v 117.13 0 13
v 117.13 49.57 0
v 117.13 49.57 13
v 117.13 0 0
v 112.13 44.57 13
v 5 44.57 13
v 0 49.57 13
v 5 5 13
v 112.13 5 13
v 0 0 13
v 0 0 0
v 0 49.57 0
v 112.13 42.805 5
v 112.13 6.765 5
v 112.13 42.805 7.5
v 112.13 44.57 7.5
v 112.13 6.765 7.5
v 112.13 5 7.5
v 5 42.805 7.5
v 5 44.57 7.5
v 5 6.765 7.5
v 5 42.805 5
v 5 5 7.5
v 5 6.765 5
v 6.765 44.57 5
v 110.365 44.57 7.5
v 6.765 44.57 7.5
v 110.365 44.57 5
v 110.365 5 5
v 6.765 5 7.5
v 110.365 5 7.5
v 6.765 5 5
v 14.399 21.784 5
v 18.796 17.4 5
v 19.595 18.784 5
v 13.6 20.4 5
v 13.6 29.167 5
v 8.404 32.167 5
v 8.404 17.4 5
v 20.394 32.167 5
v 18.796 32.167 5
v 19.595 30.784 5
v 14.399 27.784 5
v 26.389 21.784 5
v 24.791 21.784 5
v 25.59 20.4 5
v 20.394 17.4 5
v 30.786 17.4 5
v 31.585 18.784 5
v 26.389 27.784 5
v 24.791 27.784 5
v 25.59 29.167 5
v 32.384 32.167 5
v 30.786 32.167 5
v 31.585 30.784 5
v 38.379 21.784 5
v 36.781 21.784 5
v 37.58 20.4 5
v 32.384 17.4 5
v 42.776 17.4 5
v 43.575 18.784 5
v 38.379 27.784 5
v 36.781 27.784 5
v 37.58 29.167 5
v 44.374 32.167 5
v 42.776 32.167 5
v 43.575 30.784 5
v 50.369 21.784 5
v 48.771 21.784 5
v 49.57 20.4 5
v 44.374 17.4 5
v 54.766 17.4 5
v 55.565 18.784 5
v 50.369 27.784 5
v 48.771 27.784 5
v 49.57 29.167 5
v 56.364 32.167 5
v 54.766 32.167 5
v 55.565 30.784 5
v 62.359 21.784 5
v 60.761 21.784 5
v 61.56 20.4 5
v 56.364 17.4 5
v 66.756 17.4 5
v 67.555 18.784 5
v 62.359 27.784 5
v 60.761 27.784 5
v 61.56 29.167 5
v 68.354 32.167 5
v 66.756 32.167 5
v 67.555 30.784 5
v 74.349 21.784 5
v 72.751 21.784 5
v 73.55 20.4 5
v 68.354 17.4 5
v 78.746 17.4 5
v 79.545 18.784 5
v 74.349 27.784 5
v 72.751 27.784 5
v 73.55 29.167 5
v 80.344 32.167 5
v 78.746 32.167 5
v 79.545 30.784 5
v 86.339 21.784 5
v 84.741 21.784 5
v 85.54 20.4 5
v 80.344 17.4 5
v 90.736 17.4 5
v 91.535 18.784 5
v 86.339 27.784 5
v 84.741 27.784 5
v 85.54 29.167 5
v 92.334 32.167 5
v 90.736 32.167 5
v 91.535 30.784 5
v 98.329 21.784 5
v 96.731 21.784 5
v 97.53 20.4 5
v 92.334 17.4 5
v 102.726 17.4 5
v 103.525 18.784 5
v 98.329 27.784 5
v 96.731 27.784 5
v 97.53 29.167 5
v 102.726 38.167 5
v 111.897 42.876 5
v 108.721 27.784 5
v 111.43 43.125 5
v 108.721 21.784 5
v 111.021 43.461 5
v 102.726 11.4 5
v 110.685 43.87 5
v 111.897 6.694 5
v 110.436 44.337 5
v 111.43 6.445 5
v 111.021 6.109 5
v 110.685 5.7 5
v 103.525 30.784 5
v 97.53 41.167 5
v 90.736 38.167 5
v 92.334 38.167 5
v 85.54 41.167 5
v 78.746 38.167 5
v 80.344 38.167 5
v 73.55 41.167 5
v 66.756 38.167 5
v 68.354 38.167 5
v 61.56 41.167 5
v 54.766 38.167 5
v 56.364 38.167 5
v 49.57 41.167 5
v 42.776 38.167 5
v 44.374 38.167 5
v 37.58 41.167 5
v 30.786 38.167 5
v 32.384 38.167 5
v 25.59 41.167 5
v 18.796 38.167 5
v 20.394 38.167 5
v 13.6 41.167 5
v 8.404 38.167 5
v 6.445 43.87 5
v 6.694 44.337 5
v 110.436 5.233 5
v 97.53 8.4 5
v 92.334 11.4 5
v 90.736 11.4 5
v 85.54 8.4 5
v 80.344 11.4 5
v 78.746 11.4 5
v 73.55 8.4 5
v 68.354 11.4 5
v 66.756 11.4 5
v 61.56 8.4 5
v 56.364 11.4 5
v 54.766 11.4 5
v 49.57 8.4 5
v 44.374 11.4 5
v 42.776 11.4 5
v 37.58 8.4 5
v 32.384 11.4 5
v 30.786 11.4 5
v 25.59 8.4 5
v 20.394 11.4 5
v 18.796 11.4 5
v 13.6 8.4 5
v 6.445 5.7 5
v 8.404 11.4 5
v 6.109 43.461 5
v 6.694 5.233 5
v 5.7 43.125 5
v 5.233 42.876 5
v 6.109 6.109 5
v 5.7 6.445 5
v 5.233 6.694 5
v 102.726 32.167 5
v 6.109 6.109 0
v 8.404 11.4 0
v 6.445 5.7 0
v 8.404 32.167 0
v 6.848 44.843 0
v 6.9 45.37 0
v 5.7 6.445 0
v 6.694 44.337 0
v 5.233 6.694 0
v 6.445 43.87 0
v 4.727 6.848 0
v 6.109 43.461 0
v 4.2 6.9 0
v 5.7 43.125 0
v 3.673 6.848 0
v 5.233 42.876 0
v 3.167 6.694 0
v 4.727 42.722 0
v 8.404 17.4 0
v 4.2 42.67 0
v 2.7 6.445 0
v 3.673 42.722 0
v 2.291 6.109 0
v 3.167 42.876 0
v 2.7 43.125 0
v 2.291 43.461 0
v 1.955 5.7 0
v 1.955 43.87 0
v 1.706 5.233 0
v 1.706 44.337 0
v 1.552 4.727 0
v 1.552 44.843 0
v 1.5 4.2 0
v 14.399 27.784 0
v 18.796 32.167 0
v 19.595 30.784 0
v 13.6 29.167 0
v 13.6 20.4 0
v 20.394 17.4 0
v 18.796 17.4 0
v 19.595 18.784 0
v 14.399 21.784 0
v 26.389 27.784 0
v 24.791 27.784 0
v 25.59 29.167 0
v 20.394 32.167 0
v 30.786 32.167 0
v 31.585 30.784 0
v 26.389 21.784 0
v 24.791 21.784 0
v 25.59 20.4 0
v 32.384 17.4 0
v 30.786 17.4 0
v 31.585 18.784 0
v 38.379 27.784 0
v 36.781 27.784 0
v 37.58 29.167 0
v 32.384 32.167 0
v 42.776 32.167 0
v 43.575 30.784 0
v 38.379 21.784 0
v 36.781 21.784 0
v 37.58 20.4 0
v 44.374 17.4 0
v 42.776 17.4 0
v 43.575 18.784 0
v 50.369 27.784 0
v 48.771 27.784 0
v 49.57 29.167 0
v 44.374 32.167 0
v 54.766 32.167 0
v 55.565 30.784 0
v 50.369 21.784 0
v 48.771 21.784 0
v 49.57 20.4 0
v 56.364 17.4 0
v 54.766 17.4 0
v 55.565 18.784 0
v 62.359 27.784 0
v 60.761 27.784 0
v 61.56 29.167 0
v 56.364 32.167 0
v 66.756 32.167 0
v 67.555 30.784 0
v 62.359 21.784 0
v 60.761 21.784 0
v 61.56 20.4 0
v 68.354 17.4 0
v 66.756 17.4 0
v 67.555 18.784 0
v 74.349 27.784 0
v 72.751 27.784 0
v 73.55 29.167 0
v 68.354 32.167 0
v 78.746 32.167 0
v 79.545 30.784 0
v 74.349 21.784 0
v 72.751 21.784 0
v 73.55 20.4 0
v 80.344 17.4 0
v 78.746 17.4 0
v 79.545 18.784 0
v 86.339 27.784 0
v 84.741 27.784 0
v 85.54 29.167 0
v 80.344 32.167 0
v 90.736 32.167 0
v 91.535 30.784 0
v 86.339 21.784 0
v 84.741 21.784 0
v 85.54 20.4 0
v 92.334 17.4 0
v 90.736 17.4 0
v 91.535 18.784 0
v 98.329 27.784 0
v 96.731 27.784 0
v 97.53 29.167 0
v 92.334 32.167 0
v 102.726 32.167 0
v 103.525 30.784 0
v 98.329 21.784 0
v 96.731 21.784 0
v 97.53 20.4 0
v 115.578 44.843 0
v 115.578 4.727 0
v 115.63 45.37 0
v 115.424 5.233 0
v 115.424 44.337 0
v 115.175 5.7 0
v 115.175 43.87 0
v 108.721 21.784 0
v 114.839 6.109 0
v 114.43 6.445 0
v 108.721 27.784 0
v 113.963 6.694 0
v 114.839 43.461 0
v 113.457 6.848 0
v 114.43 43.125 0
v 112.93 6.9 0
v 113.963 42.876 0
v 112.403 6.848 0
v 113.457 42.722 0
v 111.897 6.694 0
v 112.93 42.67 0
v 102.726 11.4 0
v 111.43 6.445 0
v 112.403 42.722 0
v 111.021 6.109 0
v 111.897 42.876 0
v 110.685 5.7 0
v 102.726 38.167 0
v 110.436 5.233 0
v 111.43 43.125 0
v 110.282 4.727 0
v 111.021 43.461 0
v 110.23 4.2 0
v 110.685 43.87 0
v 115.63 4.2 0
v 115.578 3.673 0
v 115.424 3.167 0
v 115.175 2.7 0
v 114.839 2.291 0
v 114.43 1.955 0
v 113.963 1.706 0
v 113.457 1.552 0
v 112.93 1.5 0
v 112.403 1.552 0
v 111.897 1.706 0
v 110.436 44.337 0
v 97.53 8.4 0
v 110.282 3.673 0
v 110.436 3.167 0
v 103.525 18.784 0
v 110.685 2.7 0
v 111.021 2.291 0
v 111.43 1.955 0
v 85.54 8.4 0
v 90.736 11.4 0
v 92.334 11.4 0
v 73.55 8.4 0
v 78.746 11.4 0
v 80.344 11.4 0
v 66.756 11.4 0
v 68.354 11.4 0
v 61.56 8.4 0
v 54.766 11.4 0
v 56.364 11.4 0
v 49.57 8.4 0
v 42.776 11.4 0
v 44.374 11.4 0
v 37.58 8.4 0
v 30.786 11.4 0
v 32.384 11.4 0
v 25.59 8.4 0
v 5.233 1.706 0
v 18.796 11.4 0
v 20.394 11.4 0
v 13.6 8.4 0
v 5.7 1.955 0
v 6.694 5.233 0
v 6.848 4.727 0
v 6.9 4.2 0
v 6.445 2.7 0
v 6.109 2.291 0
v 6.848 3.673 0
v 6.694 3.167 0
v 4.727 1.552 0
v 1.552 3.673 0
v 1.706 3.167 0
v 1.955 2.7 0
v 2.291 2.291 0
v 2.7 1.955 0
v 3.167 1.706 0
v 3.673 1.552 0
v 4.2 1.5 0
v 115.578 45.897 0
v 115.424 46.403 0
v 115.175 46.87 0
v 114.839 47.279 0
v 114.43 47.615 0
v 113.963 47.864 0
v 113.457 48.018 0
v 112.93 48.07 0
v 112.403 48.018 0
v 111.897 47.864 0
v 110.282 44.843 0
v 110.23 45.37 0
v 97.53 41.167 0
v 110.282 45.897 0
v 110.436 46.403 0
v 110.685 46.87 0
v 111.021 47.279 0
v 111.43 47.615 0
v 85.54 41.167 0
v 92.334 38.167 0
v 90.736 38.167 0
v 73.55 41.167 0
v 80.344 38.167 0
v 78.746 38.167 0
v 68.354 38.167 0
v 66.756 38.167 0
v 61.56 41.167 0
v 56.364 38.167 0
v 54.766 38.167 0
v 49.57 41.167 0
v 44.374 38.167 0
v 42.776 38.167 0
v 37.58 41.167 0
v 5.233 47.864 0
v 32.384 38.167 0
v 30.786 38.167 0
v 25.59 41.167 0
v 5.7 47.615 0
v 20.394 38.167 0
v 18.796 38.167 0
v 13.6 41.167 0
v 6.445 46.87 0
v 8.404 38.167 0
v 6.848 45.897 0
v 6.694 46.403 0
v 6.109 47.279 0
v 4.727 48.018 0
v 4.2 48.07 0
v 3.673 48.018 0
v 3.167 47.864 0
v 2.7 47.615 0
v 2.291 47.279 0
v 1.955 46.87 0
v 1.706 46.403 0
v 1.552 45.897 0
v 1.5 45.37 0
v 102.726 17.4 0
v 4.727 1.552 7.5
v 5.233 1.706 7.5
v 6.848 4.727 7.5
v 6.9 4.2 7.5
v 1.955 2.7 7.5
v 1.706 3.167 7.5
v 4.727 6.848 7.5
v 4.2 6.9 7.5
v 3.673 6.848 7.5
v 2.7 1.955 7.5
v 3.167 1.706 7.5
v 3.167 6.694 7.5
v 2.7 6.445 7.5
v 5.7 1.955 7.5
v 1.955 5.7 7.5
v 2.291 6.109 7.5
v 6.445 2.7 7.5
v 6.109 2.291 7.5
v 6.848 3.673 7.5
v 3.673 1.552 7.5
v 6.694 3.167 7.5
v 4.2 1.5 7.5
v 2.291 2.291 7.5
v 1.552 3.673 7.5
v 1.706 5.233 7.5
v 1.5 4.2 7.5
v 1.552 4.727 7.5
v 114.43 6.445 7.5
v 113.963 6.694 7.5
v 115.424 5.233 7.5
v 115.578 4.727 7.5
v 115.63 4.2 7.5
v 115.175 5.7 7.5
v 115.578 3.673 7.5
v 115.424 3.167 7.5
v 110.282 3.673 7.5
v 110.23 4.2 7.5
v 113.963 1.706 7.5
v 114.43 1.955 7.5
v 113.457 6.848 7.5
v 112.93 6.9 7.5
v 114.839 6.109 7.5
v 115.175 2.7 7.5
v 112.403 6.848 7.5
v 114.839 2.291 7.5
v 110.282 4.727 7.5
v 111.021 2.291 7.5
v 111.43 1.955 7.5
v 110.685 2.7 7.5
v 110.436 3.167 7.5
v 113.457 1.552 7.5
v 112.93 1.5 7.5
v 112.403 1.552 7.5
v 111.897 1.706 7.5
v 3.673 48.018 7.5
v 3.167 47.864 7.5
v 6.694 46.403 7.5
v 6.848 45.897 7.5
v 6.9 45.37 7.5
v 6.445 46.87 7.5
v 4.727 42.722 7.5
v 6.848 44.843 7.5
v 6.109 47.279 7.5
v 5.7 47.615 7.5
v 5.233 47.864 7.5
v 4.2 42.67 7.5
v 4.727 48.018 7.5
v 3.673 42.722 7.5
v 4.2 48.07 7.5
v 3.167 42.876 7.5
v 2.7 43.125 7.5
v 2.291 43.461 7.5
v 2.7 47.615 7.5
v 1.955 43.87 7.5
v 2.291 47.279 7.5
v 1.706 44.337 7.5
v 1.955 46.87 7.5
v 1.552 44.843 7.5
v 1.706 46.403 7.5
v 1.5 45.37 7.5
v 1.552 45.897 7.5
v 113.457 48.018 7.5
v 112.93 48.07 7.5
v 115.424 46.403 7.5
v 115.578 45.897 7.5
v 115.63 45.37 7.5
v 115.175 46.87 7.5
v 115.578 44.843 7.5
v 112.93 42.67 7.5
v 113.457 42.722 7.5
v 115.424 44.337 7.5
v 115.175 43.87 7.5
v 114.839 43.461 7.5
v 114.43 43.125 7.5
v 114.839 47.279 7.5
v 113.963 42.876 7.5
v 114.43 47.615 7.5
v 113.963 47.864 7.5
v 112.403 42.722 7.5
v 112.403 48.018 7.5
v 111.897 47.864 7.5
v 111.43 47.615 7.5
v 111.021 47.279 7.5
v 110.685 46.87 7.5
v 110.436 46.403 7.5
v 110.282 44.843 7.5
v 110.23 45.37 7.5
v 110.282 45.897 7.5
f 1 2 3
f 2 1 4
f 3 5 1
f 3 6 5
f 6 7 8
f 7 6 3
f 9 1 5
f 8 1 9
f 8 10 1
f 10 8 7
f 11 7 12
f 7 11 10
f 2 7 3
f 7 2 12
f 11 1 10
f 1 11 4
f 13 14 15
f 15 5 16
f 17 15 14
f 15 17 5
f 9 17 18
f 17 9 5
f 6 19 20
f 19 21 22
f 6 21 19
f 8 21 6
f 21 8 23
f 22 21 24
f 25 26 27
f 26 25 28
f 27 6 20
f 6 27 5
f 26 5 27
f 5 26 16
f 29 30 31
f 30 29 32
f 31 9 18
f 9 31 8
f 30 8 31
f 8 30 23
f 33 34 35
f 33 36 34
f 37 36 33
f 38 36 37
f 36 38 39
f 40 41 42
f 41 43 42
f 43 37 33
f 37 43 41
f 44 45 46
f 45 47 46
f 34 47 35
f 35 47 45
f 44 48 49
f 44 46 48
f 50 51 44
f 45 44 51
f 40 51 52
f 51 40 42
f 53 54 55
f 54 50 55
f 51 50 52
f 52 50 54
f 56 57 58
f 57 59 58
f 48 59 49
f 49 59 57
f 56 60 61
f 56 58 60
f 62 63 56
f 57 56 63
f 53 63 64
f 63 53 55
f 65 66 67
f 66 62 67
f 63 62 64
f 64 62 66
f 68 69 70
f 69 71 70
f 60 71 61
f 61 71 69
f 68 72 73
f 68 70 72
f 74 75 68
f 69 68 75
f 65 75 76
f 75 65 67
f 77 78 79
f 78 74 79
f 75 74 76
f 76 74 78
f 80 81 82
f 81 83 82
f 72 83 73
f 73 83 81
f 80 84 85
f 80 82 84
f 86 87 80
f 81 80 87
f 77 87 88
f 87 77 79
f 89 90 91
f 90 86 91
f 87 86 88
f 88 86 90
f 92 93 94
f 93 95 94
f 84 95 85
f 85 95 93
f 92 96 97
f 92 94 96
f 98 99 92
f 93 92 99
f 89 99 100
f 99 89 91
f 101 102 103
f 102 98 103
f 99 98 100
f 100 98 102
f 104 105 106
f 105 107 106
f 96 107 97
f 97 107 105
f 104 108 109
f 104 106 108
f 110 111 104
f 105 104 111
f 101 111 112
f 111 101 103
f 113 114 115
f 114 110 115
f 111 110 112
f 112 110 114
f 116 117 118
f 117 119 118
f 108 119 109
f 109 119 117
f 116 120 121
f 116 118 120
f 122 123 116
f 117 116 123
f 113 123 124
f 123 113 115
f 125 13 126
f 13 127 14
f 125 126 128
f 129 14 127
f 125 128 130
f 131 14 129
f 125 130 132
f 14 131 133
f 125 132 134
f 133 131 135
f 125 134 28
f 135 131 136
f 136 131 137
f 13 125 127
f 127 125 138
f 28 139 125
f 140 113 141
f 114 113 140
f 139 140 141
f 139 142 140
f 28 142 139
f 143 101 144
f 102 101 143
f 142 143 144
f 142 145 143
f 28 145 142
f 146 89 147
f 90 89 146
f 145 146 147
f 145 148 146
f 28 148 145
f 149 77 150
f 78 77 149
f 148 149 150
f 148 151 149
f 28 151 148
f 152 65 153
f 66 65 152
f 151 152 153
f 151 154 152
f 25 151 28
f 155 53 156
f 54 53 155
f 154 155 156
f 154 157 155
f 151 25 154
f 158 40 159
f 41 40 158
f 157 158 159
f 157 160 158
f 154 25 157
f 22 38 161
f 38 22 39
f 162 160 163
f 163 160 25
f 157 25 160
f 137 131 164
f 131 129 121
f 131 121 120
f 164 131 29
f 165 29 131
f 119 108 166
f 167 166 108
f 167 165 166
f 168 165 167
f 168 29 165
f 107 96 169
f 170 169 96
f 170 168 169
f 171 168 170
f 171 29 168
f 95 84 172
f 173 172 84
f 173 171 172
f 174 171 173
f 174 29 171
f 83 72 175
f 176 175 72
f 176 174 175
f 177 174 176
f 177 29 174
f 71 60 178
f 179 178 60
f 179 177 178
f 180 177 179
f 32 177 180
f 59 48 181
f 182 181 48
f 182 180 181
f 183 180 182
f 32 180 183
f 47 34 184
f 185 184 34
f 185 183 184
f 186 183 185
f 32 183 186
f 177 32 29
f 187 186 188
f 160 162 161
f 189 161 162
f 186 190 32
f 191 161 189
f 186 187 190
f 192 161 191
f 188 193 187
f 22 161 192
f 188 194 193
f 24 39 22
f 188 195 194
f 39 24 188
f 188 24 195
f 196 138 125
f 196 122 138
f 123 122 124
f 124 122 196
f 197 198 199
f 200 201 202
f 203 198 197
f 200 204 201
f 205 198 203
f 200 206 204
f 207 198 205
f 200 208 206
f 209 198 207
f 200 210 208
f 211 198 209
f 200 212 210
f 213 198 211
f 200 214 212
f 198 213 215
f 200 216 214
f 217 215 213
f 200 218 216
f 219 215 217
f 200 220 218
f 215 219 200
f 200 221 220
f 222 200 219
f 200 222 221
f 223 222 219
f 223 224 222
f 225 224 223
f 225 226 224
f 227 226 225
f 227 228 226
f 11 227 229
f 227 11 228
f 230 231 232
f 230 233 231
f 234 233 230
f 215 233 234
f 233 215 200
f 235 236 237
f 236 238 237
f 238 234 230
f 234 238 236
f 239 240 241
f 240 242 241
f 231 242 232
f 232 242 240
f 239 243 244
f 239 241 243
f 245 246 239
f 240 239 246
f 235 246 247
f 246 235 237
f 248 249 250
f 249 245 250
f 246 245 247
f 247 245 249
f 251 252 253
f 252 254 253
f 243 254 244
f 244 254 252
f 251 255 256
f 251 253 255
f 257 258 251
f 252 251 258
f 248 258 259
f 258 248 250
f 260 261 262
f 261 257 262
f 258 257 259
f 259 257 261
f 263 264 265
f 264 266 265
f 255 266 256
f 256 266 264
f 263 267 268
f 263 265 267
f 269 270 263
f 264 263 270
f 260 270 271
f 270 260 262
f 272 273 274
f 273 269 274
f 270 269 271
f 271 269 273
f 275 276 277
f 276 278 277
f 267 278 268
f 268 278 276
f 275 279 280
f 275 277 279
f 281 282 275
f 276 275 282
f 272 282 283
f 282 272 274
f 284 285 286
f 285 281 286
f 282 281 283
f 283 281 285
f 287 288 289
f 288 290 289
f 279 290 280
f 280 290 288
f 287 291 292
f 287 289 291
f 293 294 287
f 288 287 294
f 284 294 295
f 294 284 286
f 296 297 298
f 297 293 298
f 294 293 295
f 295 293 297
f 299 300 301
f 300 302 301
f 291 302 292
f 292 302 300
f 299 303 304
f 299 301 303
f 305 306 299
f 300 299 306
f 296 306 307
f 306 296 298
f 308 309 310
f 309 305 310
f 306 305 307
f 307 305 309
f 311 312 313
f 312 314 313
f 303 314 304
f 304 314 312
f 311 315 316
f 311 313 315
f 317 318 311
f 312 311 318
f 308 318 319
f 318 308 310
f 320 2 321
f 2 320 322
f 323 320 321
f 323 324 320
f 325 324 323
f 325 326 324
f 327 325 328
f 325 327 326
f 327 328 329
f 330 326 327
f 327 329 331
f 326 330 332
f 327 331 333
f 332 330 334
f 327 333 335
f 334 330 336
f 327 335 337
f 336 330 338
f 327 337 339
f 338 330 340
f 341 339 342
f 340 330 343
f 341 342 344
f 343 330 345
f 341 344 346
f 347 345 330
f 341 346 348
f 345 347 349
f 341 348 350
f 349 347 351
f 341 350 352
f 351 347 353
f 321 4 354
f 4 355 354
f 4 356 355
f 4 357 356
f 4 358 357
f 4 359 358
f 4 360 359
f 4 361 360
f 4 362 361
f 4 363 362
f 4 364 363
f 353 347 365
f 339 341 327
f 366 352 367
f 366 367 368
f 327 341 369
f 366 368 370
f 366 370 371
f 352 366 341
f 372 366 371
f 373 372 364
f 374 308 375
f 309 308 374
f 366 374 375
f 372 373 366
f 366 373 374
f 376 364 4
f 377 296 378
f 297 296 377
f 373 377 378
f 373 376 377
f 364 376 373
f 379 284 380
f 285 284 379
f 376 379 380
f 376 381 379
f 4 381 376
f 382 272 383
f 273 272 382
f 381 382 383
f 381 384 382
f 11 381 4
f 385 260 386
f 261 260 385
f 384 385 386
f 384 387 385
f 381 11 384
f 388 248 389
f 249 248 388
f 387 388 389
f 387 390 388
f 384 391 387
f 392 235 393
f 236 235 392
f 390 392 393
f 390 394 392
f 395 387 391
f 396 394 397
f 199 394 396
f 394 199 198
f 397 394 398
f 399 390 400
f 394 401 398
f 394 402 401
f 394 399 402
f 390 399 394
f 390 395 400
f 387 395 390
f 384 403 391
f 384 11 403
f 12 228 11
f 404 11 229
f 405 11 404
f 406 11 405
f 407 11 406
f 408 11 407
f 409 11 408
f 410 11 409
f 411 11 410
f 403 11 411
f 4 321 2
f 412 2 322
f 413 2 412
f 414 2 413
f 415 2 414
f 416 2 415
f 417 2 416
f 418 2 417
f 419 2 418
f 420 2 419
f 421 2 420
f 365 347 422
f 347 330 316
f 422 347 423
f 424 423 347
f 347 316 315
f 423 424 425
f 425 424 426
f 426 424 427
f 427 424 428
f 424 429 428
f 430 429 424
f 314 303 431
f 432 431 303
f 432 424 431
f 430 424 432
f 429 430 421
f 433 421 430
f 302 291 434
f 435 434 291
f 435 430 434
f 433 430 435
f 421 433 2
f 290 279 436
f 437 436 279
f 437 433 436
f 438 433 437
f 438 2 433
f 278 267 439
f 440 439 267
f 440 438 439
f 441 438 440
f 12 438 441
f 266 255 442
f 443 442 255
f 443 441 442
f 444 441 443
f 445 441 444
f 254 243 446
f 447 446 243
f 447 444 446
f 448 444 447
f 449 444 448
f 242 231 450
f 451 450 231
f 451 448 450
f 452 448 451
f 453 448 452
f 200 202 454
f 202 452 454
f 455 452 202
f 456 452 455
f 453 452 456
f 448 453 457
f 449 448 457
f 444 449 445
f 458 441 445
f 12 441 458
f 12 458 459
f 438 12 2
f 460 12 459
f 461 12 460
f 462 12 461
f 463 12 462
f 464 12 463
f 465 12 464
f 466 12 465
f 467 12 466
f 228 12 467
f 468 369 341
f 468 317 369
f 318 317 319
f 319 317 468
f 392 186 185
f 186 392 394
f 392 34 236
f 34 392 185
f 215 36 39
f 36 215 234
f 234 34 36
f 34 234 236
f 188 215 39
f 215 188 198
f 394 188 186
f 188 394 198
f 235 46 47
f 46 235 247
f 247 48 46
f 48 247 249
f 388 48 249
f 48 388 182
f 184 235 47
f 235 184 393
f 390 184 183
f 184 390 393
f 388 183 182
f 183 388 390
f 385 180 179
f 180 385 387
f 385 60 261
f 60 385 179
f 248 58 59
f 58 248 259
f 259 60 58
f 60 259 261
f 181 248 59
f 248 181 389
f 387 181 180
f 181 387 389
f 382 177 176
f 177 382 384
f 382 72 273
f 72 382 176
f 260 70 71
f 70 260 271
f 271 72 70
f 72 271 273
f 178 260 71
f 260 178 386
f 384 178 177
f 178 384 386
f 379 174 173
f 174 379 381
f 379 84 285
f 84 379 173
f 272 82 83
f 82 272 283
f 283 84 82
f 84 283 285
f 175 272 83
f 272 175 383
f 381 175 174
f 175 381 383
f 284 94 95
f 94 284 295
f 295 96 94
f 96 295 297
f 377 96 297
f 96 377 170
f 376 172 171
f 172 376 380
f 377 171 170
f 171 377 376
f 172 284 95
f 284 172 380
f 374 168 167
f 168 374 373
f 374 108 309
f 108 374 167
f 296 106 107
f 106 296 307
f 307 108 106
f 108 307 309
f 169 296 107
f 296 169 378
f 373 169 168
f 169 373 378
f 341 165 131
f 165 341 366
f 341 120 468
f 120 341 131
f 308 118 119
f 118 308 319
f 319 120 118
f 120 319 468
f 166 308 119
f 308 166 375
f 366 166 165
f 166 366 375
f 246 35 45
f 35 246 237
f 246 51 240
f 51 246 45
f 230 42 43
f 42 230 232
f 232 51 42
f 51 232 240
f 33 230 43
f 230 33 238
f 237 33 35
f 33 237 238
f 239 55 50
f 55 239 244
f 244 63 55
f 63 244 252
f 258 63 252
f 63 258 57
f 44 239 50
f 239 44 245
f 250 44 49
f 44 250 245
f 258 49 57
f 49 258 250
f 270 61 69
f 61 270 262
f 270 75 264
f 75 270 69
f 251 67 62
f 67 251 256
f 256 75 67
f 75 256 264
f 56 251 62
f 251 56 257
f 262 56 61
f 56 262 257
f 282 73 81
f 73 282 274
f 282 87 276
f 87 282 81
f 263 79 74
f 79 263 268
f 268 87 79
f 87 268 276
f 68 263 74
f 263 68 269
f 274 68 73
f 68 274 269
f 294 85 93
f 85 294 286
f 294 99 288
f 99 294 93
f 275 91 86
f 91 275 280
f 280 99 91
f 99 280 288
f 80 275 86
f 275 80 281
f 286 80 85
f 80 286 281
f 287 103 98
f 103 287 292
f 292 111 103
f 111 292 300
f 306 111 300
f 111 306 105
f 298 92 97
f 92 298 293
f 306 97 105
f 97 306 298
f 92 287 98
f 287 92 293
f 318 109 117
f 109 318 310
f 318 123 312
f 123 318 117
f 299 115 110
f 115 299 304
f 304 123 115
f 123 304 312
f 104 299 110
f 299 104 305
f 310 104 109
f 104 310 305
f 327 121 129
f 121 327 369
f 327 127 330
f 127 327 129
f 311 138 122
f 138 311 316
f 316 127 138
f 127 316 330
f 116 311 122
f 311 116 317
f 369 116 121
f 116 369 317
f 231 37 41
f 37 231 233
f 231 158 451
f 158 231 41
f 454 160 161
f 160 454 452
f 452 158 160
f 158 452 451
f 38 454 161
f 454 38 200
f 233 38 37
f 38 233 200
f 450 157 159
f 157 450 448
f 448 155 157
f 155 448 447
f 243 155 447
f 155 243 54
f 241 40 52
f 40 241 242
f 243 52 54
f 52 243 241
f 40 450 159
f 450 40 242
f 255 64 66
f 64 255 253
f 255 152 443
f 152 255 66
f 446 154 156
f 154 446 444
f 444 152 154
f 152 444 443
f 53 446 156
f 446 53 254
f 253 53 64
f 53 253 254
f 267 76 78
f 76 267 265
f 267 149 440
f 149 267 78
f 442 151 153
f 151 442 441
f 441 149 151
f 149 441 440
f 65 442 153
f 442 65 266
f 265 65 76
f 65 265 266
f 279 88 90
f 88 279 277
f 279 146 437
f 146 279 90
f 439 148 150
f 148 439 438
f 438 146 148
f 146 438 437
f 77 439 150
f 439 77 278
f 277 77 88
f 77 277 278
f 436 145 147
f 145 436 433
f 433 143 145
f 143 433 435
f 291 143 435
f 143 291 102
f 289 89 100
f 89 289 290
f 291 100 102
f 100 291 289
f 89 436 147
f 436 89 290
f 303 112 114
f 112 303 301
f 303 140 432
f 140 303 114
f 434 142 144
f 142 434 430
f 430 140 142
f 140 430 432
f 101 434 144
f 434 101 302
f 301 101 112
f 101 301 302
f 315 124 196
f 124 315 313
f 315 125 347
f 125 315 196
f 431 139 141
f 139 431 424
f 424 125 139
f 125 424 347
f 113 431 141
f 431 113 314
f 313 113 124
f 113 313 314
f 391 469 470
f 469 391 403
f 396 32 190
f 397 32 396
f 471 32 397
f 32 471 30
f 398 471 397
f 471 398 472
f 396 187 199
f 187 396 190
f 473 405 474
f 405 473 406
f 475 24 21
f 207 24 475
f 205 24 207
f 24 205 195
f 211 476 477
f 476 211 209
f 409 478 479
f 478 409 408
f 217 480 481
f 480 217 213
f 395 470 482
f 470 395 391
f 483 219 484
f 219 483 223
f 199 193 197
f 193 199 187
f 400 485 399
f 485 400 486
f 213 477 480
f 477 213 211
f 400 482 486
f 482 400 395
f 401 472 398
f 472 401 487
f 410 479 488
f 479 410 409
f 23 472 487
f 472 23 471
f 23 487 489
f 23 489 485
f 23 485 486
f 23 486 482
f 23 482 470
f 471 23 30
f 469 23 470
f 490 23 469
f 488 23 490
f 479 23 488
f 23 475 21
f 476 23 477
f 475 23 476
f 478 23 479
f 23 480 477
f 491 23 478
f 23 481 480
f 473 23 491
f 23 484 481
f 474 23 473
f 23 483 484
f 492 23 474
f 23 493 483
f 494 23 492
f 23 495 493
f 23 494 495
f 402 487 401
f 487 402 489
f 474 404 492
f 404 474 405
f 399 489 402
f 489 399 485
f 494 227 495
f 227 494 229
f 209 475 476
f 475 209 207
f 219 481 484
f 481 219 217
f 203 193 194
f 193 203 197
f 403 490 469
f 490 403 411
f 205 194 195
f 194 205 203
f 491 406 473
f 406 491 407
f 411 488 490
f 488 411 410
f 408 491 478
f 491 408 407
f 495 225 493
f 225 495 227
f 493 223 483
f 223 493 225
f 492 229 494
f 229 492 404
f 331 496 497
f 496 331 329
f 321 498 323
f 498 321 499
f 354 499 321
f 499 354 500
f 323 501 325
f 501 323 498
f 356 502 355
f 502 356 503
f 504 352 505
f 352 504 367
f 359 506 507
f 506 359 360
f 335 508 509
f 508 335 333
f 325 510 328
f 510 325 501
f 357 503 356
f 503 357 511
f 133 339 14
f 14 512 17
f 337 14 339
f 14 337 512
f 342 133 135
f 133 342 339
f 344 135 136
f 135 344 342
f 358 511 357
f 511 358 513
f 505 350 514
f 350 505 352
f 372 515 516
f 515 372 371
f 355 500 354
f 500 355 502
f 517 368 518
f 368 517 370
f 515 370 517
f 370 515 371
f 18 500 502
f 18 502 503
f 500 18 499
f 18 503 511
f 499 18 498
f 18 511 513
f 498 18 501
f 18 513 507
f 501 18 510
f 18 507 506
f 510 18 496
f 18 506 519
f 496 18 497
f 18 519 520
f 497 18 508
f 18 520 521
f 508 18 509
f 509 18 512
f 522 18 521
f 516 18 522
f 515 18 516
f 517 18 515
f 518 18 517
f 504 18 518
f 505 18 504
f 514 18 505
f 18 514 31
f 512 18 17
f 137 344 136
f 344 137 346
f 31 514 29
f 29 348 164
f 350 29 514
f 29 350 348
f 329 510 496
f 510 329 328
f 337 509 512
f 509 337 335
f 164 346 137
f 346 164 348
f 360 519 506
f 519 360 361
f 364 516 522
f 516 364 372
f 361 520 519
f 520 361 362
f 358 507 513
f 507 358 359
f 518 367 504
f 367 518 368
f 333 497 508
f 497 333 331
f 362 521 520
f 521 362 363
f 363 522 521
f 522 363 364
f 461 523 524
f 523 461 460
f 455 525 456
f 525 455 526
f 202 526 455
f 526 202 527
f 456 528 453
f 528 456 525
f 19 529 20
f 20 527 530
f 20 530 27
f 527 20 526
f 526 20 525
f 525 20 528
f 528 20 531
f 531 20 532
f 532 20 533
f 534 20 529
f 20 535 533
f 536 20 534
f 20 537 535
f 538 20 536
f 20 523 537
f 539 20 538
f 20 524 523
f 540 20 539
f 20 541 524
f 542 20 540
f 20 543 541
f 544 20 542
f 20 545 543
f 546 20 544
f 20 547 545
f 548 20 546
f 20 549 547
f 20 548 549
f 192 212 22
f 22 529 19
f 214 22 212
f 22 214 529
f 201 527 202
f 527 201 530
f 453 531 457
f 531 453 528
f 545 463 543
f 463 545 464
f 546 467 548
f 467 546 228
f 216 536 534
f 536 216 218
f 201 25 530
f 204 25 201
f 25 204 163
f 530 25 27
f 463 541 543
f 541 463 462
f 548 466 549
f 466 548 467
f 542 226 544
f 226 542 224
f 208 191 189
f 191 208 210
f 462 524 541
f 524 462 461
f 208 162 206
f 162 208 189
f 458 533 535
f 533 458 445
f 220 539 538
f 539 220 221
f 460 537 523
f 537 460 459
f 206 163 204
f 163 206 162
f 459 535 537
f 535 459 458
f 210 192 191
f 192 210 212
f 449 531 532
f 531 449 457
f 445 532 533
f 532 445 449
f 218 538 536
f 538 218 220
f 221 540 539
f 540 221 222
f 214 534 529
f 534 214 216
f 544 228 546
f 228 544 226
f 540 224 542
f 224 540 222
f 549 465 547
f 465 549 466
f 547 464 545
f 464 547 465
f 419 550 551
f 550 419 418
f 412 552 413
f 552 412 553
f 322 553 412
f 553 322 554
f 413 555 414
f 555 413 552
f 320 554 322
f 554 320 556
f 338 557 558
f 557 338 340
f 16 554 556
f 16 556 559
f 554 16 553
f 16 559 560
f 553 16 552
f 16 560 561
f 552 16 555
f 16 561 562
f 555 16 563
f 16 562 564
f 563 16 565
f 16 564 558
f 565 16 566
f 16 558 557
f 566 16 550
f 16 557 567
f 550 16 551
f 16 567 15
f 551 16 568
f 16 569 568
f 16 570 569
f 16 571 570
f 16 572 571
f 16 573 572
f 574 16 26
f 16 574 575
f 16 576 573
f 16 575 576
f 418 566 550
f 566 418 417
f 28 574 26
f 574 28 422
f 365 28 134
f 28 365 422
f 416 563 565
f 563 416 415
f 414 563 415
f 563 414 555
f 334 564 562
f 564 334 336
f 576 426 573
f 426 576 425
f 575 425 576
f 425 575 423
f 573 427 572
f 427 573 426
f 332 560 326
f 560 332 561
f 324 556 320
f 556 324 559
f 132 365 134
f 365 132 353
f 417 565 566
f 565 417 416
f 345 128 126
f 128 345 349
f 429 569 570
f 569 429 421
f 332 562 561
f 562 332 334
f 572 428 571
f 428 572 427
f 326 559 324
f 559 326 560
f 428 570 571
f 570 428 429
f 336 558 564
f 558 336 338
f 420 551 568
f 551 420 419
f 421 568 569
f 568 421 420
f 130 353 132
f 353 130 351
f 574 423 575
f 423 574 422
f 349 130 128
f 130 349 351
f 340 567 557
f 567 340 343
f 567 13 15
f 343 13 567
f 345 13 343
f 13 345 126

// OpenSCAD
$fn = 32;

// ----------------------------------------------------------------------
// Honeycomb panel: 117.13 x 49.57 mm, 24 cells of 12 mm
// ----------------------------------------------------------------------

// --- parameters (mm) ---
panel_w = 117.13;         // panel width
panel_d = 49.57;          // panel depth
thick = 5;                // panel thickness
cell_r = 6;               // hex cell circumradius
pitch = 11.99;            // hex cell pitch (centre to centre)
web = 1.6;                // web between the cells
columns = 8;              // columns of cells
rows = 3;                 // rows of cells
cell_count = 24;          // total cells
shift_x = 13.6;           // first cell offset in x
shift_y = 14.4;           // first cell offset in y
mount_d = 5.4;            // corner mounting holes
hole_off = 4.2;           // mounting hole offset from the corners
rim_h = 13;               // rim height
rim_t = 5;                // rim wall thickness

difference() {
  union() {
    cube([panel_w, panel_d, thick]);
    /* rim around the panel, sunk 1 mm into the plate */
    translate([0, 0, thick - 1]) difference() {
      cube([panel_w, panel_d, rim_h - thick + 1]);
      translate([rim_t, rim_t, -2.5]) cube([panel_w - 2 * rim_t, panel_d - 2 * rim_t, rim_h - thick + 6]);
    }
  }
  /* hexagonal cells, point-up, cut right through the plate */
  for (row = [0 : rows - 1]) {
    for (col = [0 : columns - 1]) {
      translate([shift_x + col * pitch + (row % 2) * pitch / 2, shift_y + row * pitch * 0.866025, -2.5]) rotate([0, 0, 30]) cylinder(h = thick + 5, d = 2 * cell_r, $fn = 6);
    }
  }
  /* corner mounting holes, clear of the outer cell web */
  translate([4.2, 4.2, -2.5]) cylinder(h = thick + 5, d = mount_d);
  translate([112.93, 4.2, -2.5]) cylinder(h = thick + 5, d = mount_d);
  translate([4.2, 45.37, -2.5]) cylinder(h = thick + 5, d = mount_d);
  translate([112.93, 45.37, -2.5]) cylinder(h = thick + 5, d = mount_d);
}
